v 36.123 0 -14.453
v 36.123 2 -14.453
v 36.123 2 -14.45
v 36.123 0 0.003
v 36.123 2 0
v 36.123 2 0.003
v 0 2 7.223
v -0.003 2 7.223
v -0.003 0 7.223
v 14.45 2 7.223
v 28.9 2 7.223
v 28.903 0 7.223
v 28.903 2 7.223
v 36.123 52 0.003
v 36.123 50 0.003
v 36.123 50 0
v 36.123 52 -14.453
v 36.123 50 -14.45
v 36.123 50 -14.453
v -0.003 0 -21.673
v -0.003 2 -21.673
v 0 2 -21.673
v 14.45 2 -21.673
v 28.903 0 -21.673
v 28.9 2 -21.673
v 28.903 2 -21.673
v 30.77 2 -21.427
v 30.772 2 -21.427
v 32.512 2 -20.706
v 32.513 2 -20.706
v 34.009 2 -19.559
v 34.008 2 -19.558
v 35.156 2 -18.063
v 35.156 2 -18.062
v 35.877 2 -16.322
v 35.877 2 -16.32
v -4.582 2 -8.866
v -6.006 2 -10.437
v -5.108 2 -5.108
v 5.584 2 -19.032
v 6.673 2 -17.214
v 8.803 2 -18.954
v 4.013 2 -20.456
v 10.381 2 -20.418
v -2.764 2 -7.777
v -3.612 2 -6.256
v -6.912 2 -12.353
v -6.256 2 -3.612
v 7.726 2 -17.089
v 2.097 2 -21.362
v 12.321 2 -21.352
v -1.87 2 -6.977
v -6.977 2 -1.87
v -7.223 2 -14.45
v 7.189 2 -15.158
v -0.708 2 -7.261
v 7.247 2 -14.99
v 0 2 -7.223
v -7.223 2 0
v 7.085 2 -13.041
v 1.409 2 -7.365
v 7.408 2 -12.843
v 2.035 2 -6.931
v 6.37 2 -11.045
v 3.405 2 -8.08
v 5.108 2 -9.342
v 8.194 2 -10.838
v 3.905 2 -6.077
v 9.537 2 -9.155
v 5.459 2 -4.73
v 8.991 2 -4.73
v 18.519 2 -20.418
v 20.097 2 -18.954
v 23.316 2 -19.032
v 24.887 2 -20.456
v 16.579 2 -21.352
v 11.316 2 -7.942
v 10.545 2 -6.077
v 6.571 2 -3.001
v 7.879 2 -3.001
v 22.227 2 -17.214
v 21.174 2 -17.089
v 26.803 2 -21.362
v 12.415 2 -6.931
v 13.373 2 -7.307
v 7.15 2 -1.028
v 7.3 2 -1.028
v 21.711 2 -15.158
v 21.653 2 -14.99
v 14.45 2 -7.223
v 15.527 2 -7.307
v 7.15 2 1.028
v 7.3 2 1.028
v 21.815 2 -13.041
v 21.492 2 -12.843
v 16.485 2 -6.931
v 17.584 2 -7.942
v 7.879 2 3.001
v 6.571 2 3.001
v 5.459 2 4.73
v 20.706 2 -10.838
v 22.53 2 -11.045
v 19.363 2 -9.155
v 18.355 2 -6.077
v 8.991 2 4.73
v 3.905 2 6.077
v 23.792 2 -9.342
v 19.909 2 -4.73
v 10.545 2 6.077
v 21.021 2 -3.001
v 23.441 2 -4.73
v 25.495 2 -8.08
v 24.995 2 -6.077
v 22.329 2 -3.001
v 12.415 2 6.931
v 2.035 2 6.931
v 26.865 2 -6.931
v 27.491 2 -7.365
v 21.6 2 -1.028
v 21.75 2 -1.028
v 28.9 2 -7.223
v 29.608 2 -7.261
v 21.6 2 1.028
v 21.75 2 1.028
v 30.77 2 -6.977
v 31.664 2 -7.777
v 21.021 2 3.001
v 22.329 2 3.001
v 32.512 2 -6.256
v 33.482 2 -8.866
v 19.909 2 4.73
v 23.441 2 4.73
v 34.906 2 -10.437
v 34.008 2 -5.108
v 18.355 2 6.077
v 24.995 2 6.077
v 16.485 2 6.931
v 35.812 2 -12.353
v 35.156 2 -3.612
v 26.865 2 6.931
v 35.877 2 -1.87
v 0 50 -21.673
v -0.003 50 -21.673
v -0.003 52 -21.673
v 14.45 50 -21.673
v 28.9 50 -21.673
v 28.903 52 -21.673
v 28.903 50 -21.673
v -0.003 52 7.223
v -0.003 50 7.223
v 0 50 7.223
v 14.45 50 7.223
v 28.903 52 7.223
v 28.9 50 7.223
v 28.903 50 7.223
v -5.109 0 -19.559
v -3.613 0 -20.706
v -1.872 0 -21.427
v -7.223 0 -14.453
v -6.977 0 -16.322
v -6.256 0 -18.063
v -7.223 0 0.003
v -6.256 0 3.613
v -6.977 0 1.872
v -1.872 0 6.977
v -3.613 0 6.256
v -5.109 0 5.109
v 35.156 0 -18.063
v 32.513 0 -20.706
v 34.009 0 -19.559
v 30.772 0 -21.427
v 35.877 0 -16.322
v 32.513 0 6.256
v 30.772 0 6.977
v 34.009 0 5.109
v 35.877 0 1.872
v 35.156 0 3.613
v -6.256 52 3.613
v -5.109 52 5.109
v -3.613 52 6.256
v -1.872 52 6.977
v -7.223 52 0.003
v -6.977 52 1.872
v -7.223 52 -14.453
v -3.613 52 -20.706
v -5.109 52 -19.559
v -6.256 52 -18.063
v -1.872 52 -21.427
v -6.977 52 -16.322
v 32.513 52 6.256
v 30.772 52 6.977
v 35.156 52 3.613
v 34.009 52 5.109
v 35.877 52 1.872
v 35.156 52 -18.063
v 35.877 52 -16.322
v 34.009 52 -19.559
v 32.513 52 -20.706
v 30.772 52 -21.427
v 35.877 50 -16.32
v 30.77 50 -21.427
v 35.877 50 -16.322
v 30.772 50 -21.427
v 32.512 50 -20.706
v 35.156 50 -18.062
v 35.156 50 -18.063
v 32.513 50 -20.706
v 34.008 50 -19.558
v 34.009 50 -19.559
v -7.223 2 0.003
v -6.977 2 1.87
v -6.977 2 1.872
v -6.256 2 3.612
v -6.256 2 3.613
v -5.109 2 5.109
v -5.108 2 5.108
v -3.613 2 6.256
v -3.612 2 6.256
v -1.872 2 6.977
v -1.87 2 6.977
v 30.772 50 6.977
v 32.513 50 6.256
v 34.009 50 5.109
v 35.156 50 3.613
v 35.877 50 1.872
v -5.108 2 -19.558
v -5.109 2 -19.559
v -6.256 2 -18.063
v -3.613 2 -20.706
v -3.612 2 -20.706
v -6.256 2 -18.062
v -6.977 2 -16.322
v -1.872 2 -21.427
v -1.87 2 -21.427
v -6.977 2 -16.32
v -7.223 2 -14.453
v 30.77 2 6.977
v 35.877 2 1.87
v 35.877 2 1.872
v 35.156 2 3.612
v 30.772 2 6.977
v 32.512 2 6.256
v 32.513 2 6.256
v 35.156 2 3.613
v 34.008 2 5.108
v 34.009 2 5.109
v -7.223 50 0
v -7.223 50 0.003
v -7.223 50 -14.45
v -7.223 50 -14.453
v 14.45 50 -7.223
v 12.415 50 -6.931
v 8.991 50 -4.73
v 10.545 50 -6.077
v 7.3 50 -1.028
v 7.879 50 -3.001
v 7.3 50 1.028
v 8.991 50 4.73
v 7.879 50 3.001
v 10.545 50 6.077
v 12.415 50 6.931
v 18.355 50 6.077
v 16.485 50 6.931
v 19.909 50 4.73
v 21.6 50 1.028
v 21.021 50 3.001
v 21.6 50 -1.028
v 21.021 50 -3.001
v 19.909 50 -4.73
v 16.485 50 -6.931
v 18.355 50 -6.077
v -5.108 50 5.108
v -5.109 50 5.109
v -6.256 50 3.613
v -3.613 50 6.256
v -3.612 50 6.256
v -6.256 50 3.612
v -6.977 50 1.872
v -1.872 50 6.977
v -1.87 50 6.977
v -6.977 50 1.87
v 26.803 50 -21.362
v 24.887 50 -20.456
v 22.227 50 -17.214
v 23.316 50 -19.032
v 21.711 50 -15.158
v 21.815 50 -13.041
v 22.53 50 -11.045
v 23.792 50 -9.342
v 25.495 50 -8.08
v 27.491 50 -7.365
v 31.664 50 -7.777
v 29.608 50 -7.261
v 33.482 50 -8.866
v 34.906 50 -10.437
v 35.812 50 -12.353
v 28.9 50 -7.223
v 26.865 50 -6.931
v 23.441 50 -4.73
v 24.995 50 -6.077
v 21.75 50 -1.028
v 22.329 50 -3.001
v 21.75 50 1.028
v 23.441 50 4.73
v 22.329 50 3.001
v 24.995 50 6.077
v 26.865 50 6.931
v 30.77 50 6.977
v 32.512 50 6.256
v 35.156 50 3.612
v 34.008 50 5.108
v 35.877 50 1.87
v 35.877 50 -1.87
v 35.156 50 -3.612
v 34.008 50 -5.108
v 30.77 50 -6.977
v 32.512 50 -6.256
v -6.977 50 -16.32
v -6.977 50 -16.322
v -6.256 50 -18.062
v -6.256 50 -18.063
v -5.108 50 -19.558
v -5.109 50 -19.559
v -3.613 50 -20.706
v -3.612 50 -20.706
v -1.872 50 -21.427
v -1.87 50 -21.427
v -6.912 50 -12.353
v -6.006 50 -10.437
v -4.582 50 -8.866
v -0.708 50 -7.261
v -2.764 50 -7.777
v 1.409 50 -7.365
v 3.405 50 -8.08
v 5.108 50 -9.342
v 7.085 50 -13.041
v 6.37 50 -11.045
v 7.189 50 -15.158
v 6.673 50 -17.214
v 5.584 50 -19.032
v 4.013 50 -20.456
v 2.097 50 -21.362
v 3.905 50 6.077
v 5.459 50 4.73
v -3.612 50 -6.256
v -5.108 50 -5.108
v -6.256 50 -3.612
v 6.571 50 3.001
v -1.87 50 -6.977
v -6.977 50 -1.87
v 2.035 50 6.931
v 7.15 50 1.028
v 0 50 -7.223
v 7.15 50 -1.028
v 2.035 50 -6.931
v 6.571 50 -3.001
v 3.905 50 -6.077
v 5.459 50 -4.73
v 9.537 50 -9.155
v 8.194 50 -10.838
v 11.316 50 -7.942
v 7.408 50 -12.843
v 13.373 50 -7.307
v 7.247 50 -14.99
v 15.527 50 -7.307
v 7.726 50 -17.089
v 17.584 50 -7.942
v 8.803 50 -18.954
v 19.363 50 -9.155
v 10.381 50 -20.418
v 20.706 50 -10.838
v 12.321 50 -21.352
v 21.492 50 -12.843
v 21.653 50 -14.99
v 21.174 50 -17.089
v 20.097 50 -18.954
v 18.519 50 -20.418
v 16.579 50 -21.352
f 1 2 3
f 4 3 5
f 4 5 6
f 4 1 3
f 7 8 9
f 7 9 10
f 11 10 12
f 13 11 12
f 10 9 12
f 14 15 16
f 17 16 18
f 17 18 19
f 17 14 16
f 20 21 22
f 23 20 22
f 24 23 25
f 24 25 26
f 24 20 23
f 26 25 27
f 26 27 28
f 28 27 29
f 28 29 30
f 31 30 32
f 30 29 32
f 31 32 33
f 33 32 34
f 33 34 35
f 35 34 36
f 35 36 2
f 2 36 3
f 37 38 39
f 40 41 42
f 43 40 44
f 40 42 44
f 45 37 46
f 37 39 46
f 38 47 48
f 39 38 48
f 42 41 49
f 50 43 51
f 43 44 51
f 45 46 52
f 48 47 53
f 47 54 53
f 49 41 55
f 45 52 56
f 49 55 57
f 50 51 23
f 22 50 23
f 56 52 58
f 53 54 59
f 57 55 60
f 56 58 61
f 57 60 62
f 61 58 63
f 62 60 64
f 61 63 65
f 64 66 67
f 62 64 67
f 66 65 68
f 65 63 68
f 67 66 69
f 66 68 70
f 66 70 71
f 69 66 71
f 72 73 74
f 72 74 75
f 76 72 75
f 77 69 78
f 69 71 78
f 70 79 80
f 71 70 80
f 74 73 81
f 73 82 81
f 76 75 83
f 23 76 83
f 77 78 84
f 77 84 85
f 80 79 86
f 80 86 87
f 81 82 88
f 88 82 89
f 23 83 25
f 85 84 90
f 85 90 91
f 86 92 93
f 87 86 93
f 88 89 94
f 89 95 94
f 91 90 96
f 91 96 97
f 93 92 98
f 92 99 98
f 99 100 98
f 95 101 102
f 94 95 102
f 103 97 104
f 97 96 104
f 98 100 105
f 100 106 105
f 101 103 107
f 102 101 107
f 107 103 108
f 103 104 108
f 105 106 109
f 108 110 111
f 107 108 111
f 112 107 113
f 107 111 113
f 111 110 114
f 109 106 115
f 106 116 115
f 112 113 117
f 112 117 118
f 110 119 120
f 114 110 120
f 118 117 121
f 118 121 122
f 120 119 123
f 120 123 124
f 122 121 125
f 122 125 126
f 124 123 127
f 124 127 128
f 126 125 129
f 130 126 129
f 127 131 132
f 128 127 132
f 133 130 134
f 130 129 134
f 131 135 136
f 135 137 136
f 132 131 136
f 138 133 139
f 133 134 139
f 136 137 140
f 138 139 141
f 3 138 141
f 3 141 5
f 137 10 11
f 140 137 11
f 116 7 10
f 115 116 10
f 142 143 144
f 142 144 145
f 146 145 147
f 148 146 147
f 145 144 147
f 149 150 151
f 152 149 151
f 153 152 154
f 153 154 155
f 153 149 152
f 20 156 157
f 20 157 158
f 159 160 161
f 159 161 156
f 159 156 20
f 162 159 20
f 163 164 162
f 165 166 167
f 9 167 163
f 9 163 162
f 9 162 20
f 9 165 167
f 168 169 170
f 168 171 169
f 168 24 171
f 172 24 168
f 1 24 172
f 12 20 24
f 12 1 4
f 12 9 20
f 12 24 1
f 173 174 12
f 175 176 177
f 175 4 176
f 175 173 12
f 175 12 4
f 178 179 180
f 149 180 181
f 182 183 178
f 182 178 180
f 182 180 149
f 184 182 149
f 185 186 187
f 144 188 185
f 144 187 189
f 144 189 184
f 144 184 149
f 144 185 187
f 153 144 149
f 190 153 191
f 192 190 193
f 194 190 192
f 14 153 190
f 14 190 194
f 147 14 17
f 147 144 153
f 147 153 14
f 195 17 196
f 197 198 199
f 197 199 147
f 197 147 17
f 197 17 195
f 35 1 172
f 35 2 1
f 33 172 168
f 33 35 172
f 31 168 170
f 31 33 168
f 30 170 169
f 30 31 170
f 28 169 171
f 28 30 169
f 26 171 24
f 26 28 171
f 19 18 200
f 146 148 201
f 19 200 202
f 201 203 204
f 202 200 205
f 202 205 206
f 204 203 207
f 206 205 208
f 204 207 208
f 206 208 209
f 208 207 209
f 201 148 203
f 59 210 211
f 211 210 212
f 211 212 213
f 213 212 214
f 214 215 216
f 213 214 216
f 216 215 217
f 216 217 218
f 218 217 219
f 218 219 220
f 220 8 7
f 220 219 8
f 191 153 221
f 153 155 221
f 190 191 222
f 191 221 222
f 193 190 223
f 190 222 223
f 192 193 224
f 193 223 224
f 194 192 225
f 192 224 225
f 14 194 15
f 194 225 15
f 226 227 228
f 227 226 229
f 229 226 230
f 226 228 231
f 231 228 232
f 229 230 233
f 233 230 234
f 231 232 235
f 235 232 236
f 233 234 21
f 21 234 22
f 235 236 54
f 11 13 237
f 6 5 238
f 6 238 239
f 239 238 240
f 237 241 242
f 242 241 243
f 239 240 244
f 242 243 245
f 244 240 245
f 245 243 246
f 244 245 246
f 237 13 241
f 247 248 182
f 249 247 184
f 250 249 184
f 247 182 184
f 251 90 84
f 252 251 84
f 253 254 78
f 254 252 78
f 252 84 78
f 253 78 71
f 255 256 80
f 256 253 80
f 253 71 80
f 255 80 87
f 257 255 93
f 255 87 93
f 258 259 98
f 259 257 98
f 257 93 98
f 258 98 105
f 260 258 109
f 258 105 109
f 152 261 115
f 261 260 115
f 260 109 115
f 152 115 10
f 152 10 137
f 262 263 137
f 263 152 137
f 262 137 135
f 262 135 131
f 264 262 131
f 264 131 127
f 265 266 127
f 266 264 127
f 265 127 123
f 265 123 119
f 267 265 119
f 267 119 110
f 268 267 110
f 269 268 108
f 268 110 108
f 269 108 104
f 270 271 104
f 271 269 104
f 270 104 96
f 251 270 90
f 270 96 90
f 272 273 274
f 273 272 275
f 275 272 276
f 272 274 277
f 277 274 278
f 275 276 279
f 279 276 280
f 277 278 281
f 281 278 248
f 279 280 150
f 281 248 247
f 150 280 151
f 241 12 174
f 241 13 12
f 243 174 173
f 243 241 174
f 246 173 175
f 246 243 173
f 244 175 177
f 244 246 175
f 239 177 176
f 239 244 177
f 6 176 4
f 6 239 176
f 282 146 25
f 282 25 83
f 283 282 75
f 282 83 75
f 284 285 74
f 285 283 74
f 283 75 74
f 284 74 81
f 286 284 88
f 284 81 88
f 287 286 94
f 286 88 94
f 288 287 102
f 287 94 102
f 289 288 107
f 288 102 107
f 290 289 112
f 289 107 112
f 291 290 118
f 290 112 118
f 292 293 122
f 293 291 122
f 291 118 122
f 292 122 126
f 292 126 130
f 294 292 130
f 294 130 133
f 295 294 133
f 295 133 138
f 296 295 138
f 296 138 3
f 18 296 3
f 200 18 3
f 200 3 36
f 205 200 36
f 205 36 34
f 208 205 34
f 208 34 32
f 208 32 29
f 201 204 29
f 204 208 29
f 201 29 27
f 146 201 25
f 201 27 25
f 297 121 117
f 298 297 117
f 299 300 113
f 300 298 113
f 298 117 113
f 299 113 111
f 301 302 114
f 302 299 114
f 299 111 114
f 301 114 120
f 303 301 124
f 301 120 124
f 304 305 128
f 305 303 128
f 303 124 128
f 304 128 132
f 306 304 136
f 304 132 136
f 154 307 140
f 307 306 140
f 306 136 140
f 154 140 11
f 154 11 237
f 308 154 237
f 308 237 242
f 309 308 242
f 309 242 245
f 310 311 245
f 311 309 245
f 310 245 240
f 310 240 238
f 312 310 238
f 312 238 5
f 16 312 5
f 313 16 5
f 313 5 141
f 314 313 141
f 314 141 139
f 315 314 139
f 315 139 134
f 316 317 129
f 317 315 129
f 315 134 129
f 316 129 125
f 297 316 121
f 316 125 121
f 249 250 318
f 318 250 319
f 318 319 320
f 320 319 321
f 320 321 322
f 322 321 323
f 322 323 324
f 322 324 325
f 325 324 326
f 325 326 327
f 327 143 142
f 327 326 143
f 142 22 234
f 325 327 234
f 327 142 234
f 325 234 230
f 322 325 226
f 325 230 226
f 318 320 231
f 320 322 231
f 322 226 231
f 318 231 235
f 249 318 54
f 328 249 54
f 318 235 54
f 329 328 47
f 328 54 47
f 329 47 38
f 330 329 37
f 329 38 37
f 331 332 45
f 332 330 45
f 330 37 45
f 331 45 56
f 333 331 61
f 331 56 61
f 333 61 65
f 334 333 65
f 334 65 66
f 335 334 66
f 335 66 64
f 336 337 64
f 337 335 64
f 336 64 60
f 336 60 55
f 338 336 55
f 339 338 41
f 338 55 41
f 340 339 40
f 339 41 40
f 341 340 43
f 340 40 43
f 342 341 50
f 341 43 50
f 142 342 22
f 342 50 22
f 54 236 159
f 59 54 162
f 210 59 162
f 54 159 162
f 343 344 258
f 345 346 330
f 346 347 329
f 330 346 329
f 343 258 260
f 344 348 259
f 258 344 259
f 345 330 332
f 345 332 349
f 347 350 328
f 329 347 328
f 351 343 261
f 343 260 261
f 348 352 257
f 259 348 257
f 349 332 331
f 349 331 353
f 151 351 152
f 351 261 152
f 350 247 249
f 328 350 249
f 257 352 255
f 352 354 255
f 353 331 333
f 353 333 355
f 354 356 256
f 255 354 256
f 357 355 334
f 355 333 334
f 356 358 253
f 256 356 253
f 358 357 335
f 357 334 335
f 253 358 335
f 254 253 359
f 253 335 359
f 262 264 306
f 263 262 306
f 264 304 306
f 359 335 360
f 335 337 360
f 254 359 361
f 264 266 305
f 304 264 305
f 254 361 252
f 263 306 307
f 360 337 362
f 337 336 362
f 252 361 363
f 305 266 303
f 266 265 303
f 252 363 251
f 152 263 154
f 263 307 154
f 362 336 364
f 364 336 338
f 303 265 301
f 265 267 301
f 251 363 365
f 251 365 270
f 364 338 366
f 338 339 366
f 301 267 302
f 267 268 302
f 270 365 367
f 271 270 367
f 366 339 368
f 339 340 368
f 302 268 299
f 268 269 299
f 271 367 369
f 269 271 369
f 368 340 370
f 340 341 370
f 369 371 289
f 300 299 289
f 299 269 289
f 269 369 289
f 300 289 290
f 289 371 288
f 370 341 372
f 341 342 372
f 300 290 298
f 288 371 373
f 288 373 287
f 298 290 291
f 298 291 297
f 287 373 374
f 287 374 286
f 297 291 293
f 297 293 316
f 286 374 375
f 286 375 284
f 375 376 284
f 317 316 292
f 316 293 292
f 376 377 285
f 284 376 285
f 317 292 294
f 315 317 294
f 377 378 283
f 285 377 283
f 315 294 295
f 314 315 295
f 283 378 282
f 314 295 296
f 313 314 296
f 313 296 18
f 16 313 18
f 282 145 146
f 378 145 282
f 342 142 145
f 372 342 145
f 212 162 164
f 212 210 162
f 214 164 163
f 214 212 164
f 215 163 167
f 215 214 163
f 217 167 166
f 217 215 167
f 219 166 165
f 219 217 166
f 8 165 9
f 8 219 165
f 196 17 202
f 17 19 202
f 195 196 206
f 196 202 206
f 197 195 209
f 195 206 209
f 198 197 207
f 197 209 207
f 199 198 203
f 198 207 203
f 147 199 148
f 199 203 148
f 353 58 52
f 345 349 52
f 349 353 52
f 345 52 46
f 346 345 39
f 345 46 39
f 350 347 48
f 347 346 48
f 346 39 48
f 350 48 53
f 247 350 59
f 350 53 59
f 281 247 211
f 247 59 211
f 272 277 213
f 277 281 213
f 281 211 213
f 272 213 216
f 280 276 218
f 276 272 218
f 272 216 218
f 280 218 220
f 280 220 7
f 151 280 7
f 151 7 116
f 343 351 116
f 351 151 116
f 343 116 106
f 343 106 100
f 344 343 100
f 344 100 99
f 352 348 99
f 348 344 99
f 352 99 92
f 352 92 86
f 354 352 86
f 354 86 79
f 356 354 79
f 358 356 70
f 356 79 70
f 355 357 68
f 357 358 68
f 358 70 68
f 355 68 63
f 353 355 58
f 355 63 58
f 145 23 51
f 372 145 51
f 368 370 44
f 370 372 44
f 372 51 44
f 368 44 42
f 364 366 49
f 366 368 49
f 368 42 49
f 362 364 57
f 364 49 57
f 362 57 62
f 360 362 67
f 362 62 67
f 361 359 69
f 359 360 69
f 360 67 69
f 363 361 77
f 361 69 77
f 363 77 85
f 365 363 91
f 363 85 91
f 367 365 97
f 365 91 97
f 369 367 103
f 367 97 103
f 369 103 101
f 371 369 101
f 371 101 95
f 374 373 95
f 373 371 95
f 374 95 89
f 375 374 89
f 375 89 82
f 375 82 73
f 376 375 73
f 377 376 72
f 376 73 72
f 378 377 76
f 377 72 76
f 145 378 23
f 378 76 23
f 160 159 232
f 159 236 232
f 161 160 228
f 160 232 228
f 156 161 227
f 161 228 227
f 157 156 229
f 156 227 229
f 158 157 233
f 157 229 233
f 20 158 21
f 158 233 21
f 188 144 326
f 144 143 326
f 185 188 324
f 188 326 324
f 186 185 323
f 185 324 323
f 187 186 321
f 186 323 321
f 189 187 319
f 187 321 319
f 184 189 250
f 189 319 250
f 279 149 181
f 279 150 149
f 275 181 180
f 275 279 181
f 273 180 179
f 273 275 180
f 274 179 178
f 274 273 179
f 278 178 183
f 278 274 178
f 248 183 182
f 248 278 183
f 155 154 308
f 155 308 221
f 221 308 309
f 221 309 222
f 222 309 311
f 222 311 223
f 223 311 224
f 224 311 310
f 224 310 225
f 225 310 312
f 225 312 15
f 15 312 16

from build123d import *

# Parameters (mm, degrees)
SKETCH1_R             = 7.223333333
BOSS_EXTRUDE1_DEPTH   = 52
BOSS_EXTRUDE1_2_DEPTH = 52
BOSS_EXTRUDE1_3_DEPTH = 52
BOSS_EXTRUDE1_4_DEPTH = 52
BOSS_EXTRUDE1_5_DEPTH = 52
BOSS_EXTRUDE1_6_DEPTH = 52
SKETCH2_W             = 43.346666666
SKETCH2_H             = 28.896666666
BOSS_EXTRUDE2_DEPTH   = 2
SKETCH3_W             = 43.346666666
SKETCH3_H             = 28.896666666
BOSS_EXTRUDE3_DEPTH   = 2
FILLET1_R             = 7.22


with BuildPart() as part:
    # Sketch1 → Boss-Extrude1 (new body)
    with BuildSketch(Plane(origin=(0, 0, 0), x_dir=(1, 0, 0), z_dir=(0, 1, 0))):
        with Locations(Location((0, 0, 0), (0, 0, 90))):
            Circle(SKETCH1_R)
    extrude(amount=BOSS_EXTRUDE1_DEPTH)



with BuildPart() as body_2:
    # Sketch1 → Boss-Extrude1 2 (new body)
    with BuildSketch(Plane(origin=(0, 0, 0), x_dir=(1, 0, 0), z_dir=(0, 1, 0))):
        with Locations(Location((14.45, 0, 0), (0, 0, 90))):
            Circle(SKETCH1_R)
    extrude(amount=BOSS_EXTRUDE1_2_DEPTH)


with BuildPart() as body_3:
    # Sketch1 → Boss-Extrude1 3 (new body)
    with BuildSketch(Plane(origin=(0, 0, 0), x_dir=(1, 0, 0), z_dir=(0, 1, 0))):
        with Locations(Location((28.9, 0, 0), (0, 0, 90))):
            Circle(SKETCH1_R)
    extrude(amount=BOSS_EXTRUDE1_3_DEPTH)


with BuildPart() as body_4:
    # Sketch1 → Boss-Extrude1 4 (new body)
    with BuildSketch(Plane(origin=(0, 0, 0), x_dir=(1, 0, 0), z_dir=(0, 1, 0))):
        with Locations(Location((14.45, 14.45, 0), (0, 0, 90))):
            Circle(SKETCH1_R)
    extrude(amount=BOSS_EXTRUDE1_4_DEPTH)


with BuildPart() as body_5:
    # Sketch1 → Boss-Extrude1 5 (new body)
    with BuildSketch(Plane(origin=(0, 0, 0), x_dir=(1, 0, 0), z_dir=(0, 1, 0))):
        with Locations(Location((28.9, 14.45, 0), (0, 0, 90))):
            Circle(SKETCH1_R)
    extrude(amount=BOSS_EXTRUDE1_5_DEPTH)


with BuildPart() as body_6:
    # Sketch1 → Boss-Extrude1 6 (new body)
    with BuildSketch(Plane(origin=(0, 0, 0), x_dir=(1, 0, 0), z_dir=(0, 1, 0))):
        with Locations(Location((0, 14.45, 0), (0, 0, 90))):
            Circle(SKETCH1_R)
    extrude(amount=BOSS_EXTRUDE1_6_DEPTH)


with BuildPart() as part_1:
    add(part.part)

    add(body_2.part)  # Boss-Extrude2 merges body 2

    add(body_3.part)  # Boss-Extrude2 merges body 3

    add(body_4.part)  # Boss-Extrude2 merges body 4

    add(body_5.part)  # Boss-Extrude2 merges body 5

    add(body_6.part)  # Boss-Extrude2 merges body 6
    # Sketch2 → Boss-Extrude2 (add)
    with BuildSketch(Plane(origin=(0, 52, 0), x_dir=(1, 0, 0), z_dir=(0, 1, 0))):
        with Locations((14.45, 7.225)):
            Rectangle(SKETCH2_W, SKETCH2_H)
    extrude(amount=-BOSS_EXTRUDE2_DEPTH)

    # Sketch3 → Boss-Extrude3 (add)
    with BuildSketch(Plane.XZ):
        with Locations((14.45, -7.225)):
            Rectangle(SKETCH3_W, SKETCH3_H)
    extrude(amount=-BOSS_EXTRUDE3_DEPTH)

    # Fillet1
    fillet1_edges = [part_1.edges().sort_by_distance(p)[0] for p in [
        (36.123333333, 51, 7.223333333),
        (36.123333333, 1, 7.223333333),
        (-7.223333333, 51, 7.223333333),
        (-7.223333333, 1, 7.223333333),
        (-7.223333333, 51, -21.673333333),
        (36.123333333, 51, -21.673333333),
        (36.123333333, 1, -21.673333333),
        (-7.223333333, 1, -21.673333333),
    ]]
    fillet(fillet1_edges, radius=FILLET1_R)


solid = part_1.part
